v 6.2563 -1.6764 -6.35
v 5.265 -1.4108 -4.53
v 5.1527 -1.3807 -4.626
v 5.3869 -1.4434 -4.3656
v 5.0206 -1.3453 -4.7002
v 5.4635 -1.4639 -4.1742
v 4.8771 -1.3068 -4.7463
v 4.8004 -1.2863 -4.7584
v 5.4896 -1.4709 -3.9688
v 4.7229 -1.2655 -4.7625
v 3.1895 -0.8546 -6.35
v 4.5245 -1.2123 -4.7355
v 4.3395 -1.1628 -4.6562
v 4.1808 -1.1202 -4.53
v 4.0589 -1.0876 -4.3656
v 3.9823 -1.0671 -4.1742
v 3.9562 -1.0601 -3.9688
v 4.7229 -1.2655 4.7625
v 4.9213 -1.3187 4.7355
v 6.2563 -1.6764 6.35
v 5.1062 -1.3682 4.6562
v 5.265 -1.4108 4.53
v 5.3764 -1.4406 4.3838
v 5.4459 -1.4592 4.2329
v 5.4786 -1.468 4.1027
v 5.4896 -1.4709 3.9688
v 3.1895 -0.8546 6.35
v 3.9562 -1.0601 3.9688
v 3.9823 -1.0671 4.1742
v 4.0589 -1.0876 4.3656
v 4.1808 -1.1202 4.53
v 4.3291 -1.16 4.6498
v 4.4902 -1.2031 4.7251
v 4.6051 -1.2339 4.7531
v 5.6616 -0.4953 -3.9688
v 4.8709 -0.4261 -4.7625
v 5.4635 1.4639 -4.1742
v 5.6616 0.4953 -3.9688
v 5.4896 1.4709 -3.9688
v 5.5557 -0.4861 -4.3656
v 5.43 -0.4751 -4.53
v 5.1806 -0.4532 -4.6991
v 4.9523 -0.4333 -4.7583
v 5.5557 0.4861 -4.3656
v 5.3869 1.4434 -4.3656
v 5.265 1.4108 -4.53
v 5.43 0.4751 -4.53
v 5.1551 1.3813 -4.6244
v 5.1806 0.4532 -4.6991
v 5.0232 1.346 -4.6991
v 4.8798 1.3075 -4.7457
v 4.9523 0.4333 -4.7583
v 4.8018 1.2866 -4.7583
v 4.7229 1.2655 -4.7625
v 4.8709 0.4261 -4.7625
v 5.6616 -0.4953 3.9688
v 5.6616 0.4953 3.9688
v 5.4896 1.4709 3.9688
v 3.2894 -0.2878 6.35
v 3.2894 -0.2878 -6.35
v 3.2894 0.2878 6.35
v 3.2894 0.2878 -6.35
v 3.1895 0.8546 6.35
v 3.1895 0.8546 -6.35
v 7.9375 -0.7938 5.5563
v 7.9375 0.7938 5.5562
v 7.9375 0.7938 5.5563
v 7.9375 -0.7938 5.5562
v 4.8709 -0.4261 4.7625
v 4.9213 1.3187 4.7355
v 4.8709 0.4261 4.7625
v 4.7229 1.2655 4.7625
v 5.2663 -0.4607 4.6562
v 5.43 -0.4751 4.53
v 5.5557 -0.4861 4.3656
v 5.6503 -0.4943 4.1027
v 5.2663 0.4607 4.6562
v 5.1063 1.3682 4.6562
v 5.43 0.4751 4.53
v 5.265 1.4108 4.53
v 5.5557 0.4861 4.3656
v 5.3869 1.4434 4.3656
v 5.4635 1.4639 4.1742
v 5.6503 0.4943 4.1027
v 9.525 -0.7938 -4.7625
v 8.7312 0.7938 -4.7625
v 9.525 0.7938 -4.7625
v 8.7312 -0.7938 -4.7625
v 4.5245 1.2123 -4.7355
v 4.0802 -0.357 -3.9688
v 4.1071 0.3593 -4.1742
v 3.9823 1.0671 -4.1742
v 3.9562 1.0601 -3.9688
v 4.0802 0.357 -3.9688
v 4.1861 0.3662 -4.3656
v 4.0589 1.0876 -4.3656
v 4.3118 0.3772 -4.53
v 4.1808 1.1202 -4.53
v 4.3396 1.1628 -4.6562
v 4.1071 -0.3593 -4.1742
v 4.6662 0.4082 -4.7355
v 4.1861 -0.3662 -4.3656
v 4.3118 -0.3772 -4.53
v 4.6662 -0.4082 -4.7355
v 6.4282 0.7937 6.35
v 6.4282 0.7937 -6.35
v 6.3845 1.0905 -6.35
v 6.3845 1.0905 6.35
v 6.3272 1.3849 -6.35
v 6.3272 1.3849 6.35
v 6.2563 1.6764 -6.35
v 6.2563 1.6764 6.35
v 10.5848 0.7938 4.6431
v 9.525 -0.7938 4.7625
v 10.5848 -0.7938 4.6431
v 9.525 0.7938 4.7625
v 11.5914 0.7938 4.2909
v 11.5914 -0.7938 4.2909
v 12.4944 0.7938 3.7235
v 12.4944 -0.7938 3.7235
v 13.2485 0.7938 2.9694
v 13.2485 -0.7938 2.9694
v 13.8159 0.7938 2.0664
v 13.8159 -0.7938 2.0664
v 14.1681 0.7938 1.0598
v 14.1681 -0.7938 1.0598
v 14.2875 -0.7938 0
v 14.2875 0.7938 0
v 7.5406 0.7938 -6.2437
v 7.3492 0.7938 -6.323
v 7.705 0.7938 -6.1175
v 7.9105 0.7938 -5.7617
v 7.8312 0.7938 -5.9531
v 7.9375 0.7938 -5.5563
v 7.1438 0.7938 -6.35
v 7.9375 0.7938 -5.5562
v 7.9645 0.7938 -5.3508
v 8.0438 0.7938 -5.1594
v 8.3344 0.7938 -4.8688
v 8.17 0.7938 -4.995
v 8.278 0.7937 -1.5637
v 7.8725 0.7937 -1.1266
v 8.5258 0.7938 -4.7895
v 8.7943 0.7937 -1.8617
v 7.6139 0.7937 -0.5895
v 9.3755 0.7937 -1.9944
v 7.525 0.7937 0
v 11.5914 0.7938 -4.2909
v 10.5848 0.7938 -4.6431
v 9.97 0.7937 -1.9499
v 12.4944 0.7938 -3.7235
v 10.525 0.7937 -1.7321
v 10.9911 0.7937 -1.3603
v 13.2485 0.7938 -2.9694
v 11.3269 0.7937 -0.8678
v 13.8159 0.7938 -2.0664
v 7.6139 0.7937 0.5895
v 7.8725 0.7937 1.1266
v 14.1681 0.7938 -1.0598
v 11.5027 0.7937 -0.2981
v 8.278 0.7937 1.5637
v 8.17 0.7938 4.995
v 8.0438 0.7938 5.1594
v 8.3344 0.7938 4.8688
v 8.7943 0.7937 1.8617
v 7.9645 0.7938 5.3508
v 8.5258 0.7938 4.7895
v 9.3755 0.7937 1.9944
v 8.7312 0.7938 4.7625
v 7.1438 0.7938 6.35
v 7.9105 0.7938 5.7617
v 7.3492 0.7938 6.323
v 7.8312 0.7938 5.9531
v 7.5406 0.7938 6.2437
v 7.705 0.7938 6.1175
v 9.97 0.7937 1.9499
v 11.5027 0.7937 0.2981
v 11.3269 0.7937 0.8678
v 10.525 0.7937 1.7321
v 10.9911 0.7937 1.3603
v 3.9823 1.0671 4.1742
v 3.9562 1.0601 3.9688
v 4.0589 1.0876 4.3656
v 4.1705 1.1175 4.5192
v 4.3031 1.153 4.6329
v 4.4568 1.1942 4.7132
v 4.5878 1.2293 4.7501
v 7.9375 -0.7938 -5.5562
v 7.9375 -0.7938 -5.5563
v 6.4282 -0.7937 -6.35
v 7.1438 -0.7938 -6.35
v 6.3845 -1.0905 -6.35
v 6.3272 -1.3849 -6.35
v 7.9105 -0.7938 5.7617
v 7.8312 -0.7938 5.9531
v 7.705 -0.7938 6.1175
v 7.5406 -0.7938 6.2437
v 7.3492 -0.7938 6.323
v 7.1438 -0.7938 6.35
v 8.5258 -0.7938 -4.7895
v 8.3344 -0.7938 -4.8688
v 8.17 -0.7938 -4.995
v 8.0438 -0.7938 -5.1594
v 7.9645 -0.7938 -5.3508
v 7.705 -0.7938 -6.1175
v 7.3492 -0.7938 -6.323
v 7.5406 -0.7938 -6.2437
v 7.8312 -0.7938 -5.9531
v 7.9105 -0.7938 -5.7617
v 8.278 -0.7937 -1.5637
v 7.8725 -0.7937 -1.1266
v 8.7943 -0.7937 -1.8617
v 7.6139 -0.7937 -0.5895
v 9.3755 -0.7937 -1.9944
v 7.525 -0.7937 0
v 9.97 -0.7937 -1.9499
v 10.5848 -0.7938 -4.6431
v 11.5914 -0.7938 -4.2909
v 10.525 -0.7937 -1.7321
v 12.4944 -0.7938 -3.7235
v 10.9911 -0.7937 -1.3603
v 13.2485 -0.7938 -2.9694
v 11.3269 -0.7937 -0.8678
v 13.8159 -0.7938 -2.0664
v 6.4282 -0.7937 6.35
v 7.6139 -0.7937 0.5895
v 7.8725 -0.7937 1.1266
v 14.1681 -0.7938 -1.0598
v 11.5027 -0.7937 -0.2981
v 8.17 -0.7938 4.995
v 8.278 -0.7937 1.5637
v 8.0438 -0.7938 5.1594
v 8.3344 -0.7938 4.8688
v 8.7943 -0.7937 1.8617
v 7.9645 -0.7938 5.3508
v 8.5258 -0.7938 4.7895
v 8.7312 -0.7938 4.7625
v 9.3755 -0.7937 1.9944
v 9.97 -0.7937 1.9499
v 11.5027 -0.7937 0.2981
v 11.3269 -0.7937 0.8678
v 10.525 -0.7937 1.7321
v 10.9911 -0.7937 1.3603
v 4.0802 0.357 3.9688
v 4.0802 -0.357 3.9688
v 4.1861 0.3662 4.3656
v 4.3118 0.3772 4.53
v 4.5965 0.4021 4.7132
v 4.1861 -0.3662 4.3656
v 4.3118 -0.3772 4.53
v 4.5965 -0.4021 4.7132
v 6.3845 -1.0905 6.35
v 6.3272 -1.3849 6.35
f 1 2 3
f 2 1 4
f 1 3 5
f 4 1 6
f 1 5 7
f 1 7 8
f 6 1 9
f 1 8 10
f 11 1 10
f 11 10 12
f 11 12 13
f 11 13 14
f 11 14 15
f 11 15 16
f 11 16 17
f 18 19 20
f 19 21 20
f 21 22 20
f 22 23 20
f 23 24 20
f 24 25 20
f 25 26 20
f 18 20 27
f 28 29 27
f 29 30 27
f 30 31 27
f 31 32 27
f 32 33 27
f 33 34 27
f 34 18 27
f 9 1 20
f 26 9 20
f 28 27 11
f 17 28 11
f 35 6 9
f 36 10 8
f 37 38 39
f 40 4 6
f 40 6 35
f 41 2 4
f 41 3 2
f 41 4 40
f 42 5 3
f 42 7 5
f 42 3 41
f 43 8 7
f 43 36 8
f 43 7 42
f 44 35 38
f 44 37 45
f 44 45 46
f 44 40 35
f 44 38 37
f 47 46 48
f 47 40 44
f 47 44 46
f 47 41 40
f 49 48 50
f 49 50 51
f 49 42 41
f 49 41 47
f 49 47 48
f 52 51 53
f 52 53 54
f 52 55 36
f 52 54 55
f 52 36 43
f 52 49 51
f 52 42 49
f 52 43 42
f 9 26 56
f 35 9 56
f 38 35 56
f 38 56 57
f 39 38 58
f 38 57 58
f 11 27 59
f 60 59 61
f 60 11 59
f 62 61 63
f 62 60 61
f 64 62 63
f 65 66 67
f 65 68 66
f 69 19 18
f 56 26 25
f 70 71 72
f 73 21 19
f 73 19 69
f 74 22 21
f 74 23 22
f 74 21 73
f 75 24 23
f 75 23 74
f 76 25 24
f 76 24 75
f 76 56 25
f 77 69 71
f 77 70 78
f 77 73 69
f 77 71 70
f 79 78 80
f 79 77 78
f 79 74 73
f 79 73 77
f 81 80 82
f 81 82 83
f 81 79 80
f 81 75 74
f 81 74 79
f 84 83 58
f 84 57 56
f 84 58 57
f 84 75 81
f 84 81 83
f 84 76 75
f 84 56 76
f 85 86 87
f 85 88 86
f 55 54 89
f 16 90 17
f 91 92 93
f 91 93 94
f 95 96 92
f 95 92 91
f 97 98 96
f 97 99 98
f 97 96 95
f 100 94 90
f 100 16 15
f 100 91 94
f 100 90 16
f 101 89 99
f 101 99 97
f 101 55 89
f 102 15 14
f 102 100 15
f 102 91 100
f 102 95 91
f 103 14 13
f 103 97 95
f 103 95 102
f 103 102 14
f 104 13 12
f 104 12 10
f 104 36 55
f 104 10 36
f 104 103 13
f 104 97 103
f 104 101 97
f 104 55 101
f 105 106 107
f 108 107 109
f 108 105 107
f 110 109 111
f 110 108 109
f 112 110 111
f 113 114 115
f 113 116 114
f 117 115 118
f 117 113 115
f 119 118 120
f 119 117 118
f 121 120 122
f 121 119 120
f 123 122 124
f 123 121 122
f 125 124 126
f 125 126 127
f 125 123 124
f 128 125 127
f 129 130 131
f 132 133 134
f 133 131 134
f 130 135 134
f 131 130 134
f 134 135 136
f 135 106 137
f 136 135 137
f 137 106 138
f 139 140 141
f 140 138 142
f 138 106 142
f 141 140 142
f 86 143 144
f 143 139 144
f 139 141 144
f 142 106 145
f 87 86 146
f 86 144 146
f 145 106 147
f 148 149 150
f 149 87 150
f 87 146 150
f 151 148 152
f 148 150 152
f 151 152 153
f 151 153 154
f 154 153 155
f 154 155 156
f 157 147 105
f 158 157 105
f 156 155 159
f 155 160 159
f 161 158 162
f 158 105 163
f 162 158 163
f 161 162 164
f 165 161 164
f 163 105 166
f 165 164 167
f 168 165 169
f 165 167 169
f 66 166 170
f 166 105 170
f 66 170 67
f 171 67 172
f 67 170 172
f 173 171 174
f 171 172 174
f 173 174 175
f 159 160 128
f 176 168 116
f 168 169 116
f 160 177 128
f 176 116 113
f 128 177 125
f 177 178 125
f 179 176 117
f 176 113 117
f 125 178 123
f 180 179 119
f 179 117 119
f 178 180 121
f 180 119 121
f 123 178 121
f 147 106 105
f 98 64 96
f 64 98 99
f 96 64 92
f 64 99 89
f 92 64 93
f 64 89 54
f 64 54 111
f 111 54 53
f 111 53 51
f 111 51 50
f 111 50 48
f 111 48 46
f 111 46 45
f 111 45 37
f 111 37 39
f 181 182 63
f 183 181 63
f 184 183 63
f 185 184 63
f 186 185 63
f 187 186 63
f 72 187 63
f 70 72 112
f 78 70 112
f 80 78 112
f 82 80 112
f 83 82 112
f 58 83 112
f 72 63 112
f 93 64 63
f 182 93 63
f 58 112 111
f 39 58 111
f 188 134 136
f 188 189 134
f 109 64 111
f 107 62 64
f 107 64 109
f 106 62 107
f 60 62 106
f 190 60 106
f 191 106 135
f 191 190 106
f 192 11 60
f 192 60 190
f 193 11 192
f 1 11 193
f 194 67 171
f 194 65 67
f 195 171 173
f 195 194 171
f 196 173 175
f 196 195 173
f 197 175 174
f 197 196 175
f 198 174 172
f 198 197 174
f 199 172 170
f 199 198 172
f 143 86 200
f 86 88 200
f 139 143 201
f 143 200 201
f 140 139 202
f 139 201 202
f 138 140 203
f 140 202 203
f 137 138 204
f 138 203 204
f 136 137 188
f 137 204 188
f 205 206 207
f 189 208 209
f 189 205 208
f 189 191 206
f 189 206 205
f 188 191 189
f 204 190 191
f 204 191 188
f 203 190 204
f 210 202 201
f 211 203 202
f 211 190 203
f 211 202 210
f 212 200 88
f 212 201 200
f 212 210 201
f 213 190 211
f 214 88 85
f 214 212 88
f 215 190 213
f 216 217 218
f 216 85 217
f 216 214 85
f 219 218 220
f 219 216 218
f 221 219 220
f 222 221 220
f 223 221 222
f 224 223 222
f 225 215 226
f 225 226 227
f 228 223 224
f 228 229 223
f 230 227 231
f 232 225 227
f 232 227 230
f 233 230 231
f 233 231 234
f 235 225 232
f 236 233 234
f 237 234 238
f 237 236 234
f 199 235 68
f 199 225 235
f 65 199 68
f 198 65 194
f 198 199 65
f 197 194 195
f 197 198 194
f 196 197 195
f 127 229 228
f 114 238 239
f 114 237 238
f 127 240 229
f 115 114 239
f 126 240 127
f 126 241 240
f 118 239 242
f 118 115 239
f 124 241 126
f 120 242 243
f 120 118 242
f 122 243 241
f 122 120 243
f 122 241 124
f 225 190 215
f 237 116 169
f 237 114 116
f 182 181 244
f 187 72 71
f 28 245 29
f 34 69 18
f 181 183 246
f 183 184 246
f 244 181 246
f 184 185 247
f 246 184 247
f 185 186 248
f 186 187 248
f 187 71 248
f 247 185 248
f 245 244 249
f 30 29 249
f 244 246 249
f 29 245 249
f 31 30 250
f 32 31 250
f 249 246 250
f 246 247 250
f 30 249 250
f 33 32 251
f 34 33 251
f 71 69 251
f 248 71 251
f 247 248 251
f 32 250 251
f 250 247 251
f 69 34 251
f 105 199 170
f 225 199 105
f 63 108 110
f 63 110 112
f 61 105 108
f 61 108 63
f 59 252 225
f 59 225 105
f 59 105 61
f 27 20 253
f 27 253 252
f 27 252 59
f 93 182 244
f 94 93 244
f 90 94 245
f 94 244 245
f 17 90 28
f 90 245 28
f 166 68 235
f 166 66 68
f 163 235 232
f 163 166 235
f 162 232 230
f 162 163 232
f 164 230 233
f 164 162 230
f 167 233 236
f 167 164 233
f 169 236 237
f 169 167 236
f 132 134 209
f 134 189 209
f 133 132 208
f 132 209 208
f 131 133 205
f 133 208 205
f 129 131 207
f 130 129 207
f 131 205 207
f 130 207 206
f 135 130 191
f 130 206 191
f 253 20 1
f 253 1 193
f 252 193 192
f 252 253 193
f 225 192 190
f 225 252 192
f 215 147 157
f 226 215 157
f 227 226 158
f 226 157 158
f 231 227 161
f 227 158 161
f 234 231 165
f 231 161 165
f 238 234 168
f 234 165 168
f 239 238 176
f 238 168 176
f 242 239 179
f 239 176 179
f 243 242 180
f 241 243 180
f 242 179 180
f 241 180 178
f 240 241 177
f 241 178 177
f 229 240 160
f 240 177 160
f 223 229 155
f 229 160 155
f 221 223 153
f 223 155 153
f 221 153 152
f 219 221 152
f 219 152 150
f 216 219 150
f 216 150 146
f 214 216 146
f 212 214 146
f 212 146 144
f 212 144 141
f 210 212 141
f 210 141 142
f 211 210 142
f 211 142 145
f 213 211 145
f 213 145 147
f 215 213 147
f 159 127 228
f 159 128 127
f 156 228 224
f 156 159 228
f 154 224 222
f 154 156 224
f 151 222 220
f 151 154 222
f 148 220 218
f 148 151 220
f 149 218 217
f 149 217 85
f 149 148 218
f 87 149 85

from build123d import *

# Parameters (mm, degrees)
F0_R      = 6.477
F0_R_2    = 3.302
F1_DEPTH  = 6.35
F3_DEPTH  = 0.79375
F4_R      = 0.79374
F5_R      = 4.76249
F7_D      = 4
F8_COUNT  = 12
F10_DEPTH = 12.701
F12_DEPTH = 4.7625
F13_R     = 0.79374


# Not quite as in the source:
# - a fillet or chamfer is up to 0.001 mm smaller than in the source, because OpenCascade refuses the exact size


with BuildPart() as f1:
    # F0 (on Top) → F1 (new body, symmetric)
    with BuildSketch(Plane.XY):
        Circle(F0_R)
        Circle(F0_R_2, mode=Mode.SUBTRACT)
    extrude(amount=F1_DEPTH, both=True)

    # F2 (on Front) → F3 (join, symmetric)
    with BuildSketch(Plane.XZ):
        Polygon((7.9375, 4.7625), (7.9375, 6.35), (4.7625, 6.35), (4.7625, -6.35), (7.9375, -6.35), (7.9375, -4.7625), (14.2875, -4.7625), (14.2875, 0), (14.2875, 4.7625), align=None)
    extrude(amount=F3_DEPTH, both=True)

    # F4 (radius 0.79375 in the source; OpenCascade refuses exactly that, so slightly less here)
    f4_edges = [f1.edges().sort_by_distance(p)[0] for p in [
        (7.9375, 0, 6.35),
        (7.9375, 0, 4.7625),
        (7.9375, 0, -6.35),
        (7.9375, 0, -4.7625),
    ]]
    fillet(f4_edges, radius=F4_R)

    # F5 (radius 4.7625 in the source; OpenCascade refuses exactly that, so slightly less here)
    f5_edges = [f1.edges().sort_by_distance(p)[0] for p in [
        (14.2875, 0, -4.7625),
        (14.2875, 0, 4.7625),
    ]]
    fillet(f5_edges, radius=F5_R)

    # F7 (through all)
    with Locations(Plane.XZ.offset(0.79375)):
        with Locations((9.525, 0)):
            Hole(F7_D / 2)

    # F8: F1 ×12 about axis
    f8_axis = Axis((0, 0, 6.35), (0, 0, 1))


with BuildPart() as f1_1:
    add(f1.part)
    for i in range(1, F8_COUNT):
        add(f1.part.rotate(f8_axis, i * 360 / F8_COUNT))

    # F9 (on face) → F10 (cut, through all)
    with BuildSketch(Plane.XY.offset(6.35)):
        with BuildLine():
            Line((3.1894870784, 0.8546204869), (6.2563015769, 1.6763709551))
            Line((6.2563015769, 1.6763709551), (15.3340724923, 4.108752341))
            ThreePointArc((15.3340724923, 4.108752341), (-15.875, 0), (15.3340724923, -4.108752341))
            Line((15.3340724923, -4.108752341), (6.2563015769, -1.6763709551))
            Line((6.2563015769, -1.6763709551), (3.1894870784, -0.8546204869))
            Line((3.1894870784, -0.8546204869), (3.1894870784, 0.8546204869))
        make_face()
    extrude(amount=-F10_DEPTH, mode=Mode.SUBTRACT)

    # F11 (on Top) → F12 (cut, symmetric)
    with BuildSketch(Plane.XY):
        with BuildLine():
            Line((3.956190703, -1.060058104), (4.7228943276, -1.265495721))
            Line((4.7228943276, -1.265495721), (5.4895979523, -1.4709333381))
            ThreePointArc((5.4895979523, -1.4709333381), (5.68325, 0), (5.4895979523, 1.4709333381))
            Line((5.4895979523, 1.4709333381), (4.7228943276, 1.265495721))
            Line((4.7228943276, 1.265495721), (3.956190703, 1.060058104))
            ThreePointArc((3.956190703, 1.060058104), (4.09575, 0), (3.956190703, -1.060058104))
        make_face()
    extrude(amount=F12_DEPTH, both=True, mode=Mode.SUBTRACT)

    # F13 (radius 0.79375 in the source; OpenCascade refuses exactly that, so slightly less here)
    f13_edges = [f1_1.edges().sort_by_distance(p)[0] for p in [
        (5.68325, 0, -4.7625),
        (4.09575, 0, -4.7625),
        (4.09575, 0, 4.7625),
        (5.68325, 0, 4.7625),
    ]]
    fillet(f13_edges, radius=F13_R)


solid = f1_1.part
